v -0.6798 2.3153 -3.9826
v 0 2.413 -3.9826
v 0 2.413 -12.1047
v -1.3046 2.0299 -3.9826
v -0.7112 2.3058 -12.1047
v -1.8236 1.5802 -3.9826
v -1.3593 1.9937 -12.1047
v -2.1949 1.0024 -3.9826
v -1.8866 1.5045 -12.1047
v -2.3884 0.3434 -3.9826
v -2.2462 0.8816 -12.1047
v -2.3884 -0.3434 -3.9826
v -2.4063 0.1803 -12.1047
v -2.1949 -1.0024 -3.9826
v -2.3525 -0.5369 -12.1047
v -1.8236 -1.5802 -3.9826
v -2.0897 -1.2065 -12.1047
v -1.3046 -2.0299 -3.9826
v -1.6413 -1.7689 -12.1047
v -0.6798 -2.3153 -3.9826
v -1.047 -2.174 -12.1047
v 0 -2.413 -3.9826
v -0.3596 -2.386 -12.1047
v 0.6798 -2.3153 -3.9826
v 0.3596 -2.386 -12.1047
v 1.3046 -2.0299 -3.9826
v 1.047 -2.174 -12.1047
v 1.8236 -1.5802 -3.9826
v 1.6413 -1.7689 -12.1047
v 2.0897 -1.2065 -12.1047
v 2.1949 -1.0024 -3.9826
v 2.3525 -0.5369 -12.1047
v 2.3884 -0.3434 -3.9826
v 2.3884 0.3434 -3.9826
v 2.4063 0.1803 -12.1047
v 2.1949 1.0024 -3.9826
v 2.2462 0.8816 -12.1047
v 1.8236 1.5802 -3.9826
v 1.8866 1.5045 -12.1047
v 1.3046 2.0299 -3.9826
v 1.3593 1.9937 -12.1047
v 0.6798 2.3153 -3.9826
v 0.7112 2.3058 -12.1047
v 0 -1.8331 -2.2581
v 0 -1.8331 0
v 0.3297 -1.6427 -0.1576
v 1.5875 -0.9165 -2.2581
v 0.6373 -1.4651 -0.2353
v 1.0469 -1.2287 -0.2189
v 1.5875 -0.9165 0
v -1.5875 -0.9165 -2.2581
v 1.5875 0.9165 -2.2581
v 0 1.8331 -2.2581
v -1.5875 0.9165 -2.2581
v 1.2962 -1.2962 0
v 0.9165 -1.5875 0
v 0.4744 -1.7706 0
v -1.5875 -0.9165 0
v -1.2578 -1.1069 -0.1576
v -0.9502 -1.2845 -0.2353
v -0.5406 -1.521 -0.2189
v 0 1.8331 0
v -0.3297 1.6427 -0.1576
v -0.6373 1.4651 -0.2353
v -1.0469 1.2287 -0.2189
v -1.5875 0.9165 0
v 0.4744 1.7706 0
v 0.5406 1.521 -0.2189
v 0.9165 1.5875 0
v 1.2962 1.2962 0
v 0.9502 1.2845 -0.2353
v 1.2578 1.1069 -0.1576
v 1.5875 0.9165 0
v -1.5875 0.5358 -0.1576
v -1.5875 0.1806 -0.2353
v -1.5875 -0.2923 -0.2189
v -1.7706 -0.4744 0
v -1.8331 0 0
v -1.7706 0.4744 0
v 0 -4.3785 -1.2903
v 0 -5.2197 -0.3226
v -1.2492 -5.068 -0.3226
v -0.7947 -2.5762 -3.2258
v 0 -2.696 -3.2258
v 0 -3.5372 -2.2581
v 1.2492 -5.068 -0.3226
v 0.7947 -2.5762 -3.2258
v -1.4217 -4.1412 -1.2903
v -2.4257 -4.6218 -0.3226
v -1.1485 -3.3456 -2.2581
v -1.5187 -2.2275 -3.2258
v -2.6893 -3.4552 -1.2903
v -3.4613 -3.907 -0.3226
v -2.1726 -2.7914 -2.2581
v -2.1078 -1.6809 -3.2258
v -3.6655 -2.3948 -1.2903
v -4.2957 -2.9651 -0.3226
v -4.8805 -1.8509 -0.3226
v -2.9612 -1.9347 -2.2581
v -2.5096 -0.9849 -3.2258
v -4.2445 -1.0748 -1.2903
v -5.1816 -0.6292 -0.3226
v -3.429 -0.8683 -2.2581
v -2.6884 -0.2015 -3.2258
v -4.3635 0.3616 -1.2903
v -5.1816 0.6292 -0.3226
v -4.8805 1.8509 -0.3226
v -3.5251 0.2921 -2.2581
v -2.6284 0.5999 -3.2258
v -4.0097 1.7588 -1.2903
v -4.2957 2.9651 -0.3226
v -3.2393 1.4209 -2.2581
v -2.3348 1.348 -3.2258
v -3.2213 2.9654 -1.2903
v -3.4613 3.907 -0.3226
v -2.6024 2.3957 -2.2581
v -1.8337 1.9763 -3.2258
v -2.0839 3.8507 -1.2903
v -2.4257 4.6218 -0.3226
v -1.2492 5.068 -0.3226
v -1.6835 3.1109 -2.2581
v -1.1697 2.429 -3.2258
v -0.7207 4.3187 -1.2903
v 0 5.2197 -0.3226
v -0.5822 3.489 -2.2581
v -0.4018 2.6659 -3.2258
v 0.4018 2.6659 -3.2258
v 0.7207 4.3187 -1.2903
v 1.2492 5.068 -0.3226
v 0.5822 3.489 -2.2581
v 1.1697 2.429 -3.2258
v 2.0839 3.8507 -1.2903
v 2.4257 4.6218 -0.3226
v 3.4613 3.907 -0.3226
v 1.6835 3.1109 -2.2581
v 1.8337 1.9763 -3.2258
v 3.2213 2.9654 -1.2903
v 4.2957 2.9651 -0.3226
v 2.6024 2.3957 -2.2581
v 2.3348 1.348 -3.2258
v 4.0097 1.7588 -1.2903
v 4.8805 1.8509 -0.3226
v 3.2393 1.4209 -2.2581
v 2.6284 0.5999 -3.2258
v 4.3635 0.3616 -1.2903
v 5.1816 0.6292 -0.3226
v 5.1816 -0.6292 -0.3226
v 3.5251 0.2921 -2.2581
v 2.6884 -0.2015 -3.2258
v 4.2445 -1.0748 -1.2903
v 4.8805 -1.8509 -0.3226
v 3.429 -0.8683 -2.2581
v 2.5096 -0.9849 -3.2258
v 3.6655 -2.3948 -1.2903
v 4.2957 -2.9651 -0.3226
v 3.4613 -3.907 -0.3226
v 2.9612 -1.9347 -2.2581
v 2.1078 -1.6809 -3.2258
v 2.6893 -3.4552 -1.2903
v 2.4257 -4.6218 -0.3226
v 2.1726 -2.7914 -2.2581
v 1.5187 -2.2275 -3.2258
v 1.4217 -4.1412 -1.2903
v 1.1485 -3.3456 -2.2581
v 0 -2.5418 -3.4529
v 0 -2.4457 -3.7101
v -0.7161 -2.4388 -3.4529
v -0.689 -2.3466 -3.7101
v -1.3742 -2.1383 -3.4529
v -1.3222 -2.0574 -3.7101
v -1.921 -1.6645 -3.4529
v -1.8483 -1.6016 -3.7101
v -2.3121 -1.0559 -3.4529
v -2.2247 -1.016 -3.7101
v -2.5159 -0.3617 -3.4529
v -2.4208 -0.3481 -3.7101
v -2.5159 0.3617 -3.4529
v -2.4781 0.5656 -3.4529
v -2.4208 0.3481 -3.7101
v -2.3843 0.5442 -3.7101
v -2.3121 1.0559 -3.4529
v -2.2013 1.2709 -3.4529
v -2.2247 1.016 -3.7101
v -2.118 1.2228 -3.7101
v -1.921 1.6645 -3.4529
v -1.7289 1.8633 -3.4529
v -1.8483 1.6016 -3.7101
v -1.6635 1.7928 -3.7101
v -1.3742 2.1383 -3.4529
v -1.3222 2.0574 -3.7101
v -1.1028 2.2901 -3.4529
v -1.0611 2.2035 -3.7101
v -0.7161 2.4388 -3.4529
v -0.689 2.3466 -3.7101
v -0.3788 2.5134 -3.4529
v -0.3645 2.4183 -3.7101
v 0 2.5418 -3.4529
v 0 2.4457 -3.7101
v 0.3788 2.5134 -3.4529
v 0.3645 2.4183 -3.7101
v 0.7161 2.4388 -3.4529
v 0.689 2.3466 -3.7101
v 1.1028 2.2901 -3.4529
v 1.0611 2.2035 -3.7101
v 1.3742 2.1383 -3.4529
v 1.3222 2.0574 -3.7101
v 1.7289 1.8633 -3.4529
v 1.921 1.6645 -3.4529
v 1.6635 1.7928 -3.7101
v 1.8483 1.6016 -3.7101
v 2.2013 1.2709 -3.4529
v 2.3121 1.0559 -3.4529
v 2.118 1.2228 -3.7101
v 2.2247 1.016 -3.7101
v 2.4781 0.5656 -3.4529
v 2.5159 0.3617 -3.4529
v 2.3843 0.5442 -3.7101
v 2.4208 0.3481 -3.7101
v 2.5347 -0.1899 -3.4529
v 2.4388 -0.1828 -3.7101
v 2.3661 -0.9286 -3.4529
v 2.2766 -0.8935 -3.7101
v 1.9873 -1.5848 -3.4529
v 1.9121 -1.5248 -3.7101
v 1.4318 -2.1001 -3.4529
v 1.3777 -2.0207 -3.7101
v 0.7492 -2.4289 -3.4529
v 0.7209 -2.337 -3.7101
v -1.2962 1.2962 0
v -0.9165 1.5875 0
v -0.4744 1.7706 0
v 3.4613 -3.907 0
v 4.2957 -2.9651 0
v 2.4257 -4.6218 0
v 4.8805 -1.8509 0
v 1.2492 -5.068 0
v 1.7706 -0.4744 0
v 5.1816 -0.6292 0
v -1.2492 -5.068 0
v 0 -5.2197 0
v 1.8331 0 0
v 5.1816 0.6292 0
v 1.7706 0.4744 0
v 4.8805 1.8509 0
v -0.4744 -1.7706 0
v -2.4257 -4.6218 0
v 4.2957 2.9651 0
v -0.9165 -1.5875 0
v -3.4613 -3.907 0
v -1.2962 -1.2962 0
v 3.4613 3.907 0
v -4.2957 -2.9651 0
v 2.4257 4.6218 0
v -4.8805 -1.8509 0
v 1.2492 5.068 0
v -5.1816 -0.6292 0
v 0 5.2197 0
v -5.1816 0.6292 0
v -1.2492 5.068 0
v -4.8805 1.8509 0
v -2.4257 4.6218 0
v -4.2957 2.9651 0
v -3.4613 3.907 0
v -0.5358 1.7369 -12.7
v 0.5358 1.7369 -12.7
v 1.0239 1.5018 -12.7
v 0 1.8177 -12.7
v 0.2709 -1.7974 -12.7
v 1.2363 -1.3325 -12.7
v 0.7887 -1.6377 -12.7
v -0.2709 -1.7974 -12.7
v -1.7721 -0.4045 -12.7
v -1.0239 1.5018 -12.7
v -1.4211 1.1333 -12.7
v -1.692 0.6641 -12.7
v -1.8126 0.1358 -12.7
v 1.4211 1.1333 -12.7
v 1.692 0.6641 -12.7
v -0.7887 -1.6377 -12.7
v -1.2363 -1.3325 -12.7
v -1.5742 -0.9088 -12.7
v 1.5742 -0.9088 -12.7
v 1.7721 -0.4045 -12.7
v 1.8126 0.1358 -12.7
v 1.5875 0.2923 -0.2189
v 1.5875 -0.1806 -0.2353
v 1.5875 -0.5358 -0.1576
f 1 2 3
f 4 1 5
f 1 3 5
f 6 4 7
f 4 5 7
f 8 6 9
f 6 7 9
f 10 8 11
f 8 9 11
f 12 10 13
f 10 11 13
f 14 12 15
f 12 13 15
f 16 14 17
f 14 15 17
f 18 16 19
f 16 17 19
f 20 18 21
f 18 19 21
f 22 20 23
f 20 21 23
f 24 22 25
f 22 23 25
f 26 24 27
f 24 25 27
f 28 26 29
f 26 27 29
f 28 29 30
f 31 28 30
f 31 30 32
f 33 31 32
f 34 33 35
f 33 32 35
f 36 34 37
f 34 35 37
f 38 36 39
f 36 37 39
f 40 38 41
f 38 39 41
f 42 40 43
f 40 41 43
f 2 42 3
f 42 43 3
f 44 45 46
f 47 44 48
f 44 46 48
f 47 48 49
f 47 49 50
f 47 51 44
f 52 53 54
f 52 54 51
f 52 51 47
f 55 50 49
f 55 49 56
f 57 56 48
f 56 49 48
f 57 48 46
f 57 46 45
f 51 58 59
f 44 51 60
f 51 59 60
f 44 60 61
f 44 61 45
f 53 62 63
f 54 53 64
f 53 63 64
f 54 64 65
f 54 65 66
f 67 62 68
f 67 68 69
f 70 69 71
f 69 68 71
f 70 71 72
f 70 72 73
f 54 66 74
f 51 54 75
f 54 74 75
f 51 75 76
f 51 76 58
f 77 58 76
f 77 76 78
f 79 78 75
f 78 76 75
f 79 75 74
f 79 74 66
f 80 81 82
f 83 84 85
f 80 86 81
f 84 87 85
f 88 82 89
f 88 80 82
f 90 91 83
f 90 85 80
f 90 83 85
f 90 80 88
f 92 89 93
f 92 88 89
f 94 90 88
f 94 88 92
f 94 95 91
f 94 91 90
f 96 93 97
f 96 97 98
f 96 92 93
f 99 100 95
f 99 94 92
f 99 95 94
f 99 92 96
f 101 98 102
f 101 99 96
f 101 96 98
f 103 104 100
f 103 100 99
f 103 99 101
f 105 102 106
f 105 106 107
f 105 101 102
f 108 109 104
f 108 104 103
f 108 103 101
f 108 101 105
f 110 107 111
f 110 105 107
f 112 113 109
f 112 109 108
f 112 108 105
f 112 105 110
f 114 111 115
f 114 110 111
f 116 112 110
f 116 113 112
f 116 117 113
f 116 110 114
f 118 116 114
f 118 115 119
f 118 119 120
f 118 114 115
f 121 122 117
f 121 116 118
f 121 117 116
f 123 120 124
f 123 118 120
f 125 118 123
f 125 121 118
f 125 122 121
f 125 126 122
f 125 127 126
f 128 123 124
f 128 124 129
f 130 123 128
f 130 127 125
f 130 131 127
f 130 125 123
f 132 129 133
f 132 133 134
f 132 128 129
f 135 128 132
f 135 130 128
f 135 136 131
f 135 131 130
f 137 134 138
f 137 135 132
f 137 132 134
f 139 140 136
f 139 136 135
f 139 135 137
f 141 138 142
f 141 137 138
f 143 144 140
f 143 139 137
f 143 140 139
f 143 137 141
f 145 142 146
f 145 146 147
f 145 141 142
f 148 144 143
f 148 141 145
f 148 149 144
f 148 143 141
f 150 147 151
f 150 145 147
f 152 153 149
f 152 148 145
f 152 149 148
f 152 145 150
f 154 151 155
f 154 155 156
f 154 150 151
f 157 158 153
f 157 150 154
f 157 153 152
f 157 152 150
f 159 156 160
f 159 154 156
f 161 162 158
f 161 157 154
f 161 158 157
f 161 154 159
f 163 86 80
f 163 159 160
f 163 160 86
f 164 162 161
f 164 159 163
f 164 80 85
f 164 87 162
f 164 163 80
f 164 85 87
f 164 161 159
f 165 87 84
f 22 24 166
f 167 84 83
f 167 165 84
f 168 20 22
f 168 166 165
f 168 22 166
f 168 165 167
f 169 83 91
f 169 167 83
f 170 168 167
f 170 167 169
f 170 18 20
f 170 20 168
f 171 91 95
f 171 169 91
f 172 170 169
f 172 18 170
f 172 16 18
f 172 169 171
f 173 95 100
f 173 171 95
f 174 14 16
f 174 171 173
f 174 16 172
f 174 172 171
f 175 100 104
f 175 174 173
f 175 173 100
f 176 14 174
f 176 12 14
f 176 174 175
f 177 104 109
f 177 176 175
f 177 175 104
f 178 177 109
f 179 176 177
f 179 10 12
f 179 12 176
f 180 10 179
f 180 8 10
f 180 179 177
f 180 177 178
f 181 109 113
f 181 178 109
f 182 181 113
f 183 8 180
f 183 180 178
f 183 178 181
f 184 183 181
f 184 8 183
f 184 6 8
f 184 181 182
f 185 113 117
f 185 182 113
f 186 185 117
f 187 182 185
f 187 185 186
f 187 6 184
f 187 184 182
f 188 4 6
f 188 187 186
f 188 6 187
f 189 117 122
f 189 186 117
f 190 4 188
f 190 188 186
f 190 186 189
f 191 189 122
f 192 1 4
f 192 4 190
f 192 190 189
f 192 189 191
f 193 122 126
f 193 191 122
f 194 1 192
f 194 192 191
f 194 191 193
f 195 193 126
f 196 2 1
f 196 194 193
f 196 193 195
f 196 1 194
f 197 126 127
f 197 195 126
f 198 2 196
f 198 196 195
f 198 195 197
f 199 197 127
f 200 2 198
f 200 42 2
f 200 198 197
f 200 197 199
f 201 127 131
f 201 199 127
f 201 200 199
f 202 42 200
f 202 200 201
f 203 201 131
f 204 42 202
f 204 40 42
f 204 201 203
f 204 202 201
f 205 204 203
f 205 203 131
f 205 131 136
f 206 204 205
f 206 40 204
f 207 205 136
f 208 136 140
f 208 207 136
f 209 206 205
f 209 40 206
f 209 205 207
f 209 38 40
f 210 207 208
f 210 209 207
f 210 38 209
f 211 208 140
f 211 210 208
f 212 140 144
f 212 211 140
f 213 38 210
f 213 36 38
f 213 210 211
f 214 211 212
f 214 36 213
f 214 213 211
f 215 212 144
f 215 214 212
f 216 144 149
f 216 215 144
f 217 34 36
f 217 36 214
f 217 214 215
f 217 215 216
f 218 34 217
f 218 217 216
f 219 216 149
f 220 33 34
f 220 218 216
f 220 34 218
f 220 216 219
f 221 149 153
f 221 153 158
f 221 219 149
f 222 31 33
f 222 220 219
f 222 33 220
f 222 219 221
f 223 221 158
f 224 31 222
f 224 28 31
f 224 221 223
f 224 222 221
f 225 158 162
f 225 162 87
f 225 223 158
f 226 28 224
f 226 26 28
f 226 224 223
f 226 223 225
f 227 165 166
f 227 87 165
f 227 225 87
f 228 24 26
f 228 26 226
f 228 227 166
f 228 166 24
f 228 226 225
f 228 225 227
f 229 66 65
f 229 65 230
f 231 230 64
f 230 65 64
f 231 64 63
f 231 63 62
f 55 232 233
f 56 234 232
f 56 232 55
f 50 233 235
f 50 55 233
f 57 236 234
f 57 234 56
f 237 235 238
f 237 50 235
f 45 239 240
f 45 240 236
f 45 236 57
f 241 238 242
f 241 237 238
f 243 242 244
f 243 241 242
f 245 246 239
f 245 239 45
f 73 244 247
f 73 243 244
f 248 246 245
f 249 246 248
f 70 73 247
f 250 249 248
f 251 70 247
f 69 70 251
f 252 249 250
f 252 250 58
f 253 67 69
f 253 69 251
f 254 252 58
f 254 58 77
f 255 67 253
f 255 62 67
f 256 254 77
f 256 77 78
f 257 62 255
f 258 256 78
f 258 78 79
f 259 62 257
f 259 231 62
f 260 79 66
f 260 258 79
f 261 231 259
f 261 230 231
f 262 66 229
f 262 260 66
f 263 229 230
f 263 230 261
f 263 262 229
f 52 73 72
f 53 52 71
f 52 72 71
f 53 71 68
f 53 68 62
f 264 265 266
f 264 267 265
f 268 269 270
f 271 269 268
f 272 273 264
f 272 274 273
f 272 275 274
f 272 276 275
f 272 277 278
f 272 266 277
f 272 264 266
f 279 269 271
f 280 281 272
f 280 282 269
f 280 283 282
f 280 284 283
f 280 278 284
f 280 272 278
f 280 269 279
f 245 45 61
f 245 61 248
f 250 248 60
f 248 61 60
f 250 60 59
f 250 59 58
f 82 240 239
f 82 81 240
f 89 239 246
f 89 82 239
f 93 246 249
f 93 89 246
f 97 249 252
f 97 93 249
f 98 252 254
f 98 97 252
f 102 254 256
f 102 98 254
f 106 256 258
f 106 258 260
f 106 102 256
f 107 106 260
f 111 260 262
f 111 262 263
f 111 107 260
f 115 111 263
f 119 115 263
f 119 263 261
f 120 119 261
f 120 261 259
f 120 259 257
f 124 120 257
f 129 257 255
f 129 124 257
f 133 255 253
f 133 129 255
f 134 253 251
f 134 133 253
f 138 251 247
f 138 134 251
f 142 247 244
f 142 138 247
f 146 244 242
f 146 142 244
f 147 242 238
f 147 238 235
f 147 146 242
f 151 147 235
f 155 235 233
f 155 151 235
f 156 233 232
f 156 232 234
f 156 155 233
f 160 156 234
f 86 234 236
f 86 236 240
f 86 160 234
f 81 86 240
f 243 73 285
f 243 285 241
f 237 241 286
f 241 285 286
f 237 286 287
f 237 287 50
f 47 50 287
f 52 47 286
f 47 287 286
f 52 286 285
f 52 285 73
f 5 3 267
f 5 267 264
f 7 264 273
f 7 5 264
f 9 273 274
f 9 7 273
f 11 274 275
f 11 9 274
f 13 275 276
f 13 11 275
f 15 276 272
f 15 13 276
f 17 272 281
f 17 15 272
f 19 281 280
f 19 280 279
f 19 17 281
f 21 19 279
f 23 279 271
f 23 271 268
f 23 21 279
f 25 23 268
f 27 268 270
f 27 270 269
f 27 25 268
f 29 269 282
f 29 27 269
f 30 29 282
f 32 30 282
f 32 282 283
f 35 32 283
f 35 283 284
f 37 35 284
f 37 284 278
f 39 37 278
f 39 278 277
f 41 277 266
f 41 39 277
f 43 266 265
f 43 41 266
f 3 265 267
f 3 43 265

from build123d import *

# Parameters (mm, degrees)
SKETCH1_W          = 12.7
SKETCH1_H          = 2.413
CHAMFER1_SIZE      = 0.5953125
CUT_EXTRUDE2_DEPTH = 2.25806


with BuildPart() as part:
    # Sketch1 → Revolve1 (revolve)
    with BuildSketch(Plane(origin=(0, 0, 0), x_dir=(0, 0, -1), z_dir=(1, 0, 0))):
        with Locations((6.35, 1.2065)):
            Rectangle(SKETCH1_W, SKETCH1_H)
    revolve(axis=Axis((0, 0, -12.7), (0, 0, 1)))

    # Chamfer1
    chamfer1_edges = [part.edges().sort_by_distance(p)[0] for p in [
        (0, -2.413, -12.7),
    ]]
    chamfer(chamfer1_edges, length=CHAMFER1_SIZE)


with BuildPart() as body_2:
    # Sketch7 → Revolve2 (revolve)
    with BuildSketch(Plane(origin=(0, 0, 0), x_dir=(0, 0, -1), z_dir=(1, 0, 0)), mode=Mode.PRIVATE) as revolve2_sk:
        with BuildLine():
            Line((0, 5.2197), (0.32258, 5.2197))
            Line((0.32258, 5.2197), (3.2258, 2.695969357))
            ThreePointArc((3.2258, 2.695969357), (3.578633365, 2.486055564), (3.982635924, 2.413))
            Line((3.982635924, 2.413), (3.982635924, 0))
            Line((3.982635924, 0), (0, 0))
            Line((0, 0), (0, 5.2197))
        make_face()
    revolve(revolve2_sk.sketch.rotate(Axis((0, 0, 0), (0, 0, -1)), 180), axis=Axis((0, 0, 0), (0, 0, -1)))

    # Boss-Extrude1 cone 1 section (through the dimple's axis) → Boss-Extrude1 (revolve)
    with BuildSketch(Plane(origin=(0, 0, -3.982635924), x_dir=(0, -1, 0), z_dir=(1, 0, 0))):
        Polygon((0, 0), (2.413, 0), (0, 2.413), align=None)
    revolve(axis=Axis((0, 0, -3.982635924), (0, 0, -1)))

    # Combine1: union part
    add(part.part)

    # Sketch5 → Cut-Extrude2 (cut)
    with BuildSketch(Plane.XY):
        Polygon((1.5875, -0.916543552), (1.5875, 0.916543552), (0, 1.833087105), (-1.5875, 0.916543552), (-1.5875, -0.916543552), (0, -1.833087105), align=None)
    extrude(amount=-CUT_EXTRUDE2_DEPTH, mode=Mode.SUBTRACT)

    # Cut-Extrude3 cone 1 section (through the dimple's axis) → Cut-Extrude3 (revolve, cut)
    with BuildSketch(Plane(origin=(0, 0, 0), x_dir=(0, -1, 0), z_dir=(1, 0, 0))):
        Polygon((0, 0), (1.833087105, 0), (0, 1.833087105), align=None)
    revolve(axis=Axis((0, 0, 0), (0, 0, -1)), mode=Mode.SUBTRACT)


solid = body_2.part
